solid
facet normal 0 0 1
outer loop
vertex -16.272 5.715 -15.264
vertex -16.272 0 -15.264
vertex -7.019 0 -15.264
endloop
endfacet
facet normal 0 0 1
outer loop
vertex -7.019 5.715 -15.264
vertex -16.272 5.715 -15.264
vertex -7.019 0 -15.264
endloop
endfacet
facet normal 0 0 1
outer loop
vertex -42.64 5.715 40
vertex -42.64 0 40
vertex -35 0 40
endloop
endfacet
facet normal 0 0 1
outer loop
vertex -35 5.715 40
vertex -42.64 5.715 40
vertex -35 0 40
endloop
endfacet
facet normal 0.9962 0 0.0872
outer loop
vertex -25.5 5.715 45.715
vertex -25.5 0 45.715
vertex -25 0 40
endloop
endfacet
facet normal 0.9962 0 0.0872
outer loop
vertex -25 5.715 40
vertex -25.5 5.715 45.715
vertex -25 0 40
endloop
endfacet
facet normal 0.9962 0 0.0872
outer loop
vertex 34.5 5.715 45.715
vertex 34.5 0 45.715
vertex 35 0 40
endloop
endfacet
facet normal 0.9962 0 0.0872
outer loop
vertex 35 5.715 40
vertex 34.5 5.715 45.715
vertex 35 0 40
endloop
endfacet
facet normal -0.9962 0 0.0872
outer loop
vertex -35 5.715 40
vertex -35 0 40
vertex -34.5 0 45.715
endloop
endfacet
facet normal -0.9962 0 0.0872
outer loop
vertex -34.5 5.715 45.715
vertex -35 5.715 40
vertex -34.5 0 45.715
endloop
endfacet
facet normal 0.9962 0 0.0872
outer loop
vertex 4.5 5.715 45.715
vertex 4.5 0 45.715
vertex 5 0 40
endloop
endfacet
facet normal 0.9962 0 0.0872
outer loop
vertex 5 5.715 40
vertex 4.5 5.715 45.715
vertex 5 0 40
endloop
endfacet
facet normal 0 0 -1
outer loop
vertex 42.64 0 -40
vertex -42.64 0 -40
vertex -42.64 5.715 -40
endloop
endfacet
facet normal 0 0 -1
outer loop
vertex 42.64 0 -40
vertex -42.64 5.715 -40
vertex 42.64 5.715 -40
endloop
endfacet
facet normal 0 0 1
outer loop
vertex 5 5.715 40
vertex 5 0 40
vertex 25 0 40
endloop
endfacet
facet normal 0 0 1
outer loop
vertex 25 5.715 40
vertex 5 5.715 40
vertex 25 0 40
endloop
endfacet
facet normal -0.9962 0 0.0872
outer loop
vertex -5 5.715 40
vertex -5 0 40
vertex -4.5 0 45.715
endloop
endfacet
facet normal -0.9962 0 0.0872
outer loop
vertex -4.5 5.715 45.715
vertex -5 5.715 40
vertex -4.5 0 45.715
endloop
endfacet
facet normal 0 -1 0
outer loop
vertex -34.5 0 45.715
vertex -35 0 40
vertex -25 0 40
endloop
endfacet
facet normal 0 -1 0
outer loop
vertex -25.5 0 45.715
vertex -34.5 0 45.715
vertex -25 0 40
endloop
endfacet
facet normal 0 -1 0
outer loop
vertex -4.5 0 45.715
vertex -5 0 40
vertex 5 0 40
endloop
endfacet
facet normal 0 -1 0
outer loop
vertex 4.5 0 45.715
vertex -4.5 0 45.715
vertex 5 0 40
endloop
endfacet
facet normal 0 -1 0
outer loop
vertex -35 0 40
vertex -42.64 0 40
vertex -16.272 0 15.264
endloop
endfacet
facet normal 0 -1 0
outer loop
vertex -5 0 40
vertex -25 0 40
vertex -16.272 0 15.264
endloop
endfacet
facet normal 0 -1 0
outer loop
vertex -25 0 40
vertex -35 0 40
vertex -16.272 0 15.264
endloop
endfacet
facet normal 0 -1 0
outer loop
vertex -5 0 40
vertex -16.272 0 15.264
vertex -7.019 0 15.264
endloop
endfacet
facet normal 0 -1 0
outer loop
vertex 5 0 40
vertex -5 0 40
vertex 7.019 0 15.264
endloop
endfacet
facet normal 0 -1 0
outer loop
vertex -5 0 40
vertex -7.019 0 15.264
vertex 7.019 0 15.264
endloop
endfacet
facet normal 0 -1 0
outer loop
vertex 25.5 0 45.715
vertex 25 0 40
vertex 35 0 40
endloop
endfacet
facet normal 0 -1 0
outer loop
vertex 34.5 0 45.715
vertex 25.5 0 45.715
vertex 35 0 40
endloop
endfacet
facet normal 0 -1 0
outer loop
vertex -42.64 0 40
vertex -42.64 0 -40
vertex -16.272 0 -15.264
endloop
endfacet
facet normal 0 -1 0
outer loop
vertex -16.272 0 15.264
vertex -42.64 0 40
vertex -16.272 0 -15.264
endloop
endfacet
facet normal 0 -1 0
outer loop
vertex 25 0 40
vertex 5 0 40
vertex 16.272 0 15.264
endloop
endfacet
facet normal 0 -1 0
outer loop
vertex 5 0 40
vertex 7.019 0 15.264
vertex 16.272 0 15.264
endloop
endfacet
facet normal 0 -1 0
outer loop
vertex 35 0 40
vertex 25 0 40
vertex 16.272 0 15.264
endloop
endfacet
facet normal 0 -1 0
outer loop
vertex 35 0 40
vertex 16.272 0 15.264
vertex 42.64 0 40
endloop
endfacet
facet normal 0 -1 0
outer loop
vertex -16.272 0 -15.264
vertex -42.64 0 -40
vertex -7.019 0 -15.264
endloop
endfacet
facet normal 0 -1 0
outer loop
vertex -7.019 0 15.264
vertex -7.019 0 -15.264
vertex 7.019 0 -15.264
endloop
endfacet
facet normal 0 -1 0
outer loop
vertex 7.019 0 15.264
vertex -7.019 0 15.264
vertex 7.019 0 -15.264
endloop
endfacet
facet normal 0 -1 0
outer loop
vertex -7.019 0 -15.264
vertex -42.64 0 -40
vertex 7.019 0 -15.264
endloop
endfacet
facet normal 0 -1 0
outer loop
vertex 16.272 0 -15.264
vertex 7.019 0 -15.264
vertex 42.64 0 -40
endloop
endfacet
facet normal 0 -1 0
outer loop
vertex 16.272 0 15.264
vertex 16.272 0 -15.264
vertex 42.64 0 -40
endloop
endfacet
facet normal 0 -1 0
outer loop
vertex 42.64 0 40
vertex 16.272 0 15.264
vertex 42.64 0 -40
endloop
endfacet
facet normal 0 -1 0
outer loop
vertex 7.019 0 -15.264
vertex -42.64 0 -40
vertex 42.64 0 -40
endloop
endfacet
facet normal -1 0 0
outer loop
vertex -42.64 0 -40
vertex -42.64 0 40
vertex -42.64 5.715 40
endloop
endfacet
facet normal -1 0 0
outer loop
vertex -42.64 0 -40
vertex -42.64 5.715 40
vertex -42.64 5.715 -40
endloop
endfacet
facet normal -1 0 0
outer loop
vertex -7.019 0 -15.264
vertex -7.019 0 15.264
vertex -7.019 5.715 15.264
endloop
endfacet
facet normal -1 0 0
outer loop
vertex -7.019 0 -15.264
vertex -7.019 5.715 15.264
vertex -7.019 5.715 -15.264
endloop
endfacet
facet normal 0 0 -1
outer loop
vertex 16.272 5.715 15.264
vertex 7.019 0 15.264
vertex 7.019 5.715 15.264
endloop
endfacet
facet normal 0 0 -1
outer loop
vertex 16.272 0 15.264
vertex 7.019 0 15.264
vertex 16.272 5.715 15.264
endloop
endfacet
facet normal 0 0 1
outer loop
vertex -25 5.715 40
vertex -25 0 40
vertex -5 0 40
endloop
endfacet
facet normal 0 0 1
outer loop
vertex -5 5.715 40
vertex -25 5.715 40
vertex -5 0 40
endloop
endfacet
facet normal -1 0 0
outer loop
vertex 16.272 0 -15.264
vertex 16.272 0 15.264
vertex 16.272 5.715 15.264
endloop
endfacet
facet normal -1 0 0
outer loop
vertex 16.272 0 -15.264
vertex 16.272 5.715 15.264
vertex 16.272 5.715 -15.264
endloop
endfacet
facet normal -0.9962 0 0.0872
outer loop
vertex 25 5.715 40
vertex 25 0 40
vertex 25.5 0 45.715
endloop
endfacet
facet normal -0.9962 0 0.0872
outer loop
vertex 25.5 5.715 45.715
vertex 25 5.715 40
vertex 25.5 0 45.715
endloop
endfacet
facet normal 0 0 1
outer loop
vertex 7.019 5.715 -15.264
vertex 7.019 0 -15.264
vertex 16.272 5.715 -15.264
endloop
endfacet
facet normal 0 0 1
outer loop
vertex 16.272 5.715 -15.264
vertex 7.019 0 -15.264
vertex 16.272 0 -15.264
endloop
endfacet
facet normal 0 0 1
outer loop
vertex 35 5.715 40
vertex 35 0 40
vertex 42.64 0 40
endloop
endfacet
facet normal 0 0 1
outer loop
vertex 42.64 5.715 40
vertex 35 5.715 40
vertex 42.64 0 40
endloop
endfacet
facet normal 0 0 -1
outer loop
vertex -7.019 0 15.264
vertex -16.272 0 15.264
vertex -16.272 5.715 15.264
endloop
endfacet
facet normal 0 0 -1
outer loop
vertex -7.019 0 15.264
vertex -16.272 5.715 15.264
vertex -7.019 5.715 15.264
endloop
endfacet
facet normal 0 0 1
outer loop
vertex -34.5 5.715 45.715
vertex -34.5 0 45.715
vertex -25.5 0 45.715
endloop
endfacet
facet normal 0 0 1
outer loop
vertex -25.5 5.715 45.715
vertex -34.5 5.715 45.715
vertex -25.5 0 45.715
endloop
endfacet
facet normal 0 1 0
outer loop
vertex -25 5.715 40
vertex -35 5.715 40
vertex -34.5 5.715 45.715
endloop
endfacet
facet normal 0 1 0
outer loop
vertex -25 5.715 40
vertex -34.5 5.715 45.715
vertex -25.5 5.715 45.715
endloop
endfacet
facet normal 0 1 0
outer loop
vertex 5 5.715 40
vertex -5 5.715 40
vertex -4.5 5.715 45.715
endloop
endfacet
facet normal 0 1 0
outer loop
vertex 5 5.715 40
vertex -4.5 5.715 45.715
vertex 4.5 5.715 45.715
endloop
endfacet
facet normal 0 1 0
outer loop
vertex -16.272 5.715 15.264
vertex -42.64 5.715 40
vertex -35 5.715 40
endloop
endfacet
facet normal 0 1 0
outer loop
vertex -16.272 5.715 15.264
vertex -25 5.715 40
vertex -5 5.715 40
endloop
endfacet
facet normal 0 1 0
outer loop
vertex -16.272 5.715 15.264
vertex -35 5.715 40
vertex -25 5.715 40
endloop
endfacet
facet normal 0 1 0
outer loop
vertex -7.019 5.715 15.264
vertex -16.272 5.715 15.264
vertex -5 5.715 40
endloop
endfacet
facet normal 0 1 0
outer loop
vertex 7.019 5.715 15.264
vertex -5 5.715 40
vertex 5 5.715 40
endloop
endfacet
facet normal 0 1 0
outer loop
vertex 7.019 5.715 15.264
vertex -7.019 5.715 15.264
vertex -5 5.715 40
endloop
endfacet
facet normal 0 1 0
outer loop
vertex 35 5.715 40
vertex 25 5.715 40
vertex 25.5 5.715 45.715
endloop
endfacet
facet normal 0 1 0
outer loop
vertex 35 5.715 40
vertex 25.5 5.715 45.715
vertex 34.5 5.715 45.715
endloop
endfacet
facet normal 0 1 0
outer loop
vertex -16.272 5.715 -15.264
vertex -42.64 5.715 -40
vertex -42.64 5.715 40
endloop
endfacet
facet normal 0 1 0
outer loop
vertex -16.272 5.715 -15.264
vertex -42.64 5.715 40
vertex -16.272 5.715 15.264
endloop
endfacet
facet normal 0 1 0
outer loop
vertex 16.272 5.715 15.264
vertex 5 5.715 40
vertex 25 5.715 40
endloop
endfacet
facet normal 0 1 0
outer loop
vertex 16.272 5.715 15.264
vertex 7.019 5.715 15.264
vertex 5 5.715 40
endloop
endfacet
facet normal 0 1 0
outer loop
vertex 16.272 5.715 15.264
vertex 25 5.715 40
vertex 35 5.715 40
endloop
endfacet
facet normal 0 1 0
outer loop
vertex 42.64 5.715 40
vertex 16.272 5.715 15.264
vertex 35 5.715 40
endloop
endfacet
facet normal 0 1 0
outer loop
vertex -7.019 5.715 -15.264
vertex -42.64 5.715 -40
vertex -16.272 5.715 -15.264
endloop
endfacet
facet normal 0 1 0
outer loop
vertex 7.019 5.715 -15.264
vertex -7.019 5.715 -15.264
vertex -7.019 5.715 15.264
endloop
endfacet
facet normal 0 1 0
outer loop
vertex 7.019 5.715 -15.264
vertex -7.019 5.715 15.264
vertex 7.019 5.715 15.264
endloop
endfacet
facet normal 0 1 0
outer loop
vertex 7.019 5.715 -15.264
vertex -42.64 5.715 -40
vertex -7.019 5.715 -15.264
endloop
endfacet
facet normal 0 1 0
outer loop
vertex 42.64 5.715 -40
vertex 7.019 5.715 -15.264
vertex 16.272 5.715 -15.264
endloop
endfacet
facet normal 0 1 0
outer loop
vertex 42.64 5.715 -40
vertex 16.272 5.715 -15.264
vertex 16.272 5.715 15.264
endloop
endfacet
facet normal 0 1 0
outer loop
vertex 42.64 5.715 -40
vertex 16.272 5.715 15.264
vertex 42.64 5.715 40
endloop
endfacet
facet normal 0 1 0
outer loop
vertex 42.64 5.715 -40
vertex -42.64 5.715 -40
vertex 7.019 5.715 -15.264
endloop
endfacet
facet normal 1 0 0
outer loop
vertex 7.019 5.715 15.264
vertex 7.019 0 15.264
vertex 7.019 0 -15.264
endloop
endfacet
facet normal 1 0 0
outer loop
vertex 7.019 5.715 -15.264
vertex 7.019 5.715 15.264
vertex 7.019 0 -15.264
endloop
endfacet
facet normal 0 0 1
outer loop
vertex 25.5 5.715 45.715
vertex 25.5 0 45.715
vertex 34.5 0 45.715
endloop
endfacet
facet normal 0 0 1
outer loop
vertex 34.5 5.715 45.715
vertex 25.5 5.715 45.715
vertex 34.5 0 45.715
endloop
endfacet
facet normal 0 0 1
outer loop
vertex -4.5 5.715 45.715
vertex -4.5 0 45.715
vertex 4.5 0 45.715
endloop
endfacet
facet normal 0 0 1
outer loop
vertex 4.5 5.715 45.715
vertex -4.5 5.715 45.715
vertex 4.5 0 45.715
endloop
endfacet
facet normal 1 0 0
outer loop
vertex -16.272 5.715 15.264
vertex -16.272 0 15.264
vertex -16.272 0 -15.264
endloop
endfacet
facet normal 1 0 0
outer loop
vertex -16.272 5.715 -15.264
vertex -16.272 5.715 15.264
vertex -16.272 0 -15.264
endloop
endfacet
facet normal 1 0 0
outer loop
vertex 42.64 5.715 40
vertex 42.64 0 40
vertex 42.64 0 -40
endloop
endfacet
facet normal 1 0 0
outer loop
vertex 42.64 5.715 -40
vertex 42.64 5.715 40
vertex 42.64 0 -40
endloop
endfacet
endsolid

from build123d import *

# Parameters (mm, degrees)
SKETCH2_W           = 85.279590556
SKETCH2_H           = 80
SKETCH2_W_2         = 9.25294304
SKETCH2_H_2         = 30.528437524
BOSS_EXTRUDE1_DEPTH = 5.715


with BuildPart() as part:
    # Sketch2 → Boss-Extrude1 (new body)
    with BuildSketch(Plane(origin=(0, 0, 0), x_dir=(1, 0, 0), z_dir=(0, 1, 0))):
        Rectangle(SKETCH2_W, SKETCH2_H)
        with Locations((-11.645107557, 0)):
            Rectangle(SKETCH2_W_2, SKETCH2_H_2, mode=Mode.SUBTRACT)
        with Locations((11.645107557, 0)):
            Rectangle(SKETCH2_W_2, SKETCH2_H_2, mode=Mode.SUBTRACT)
        Polygon((-25, -40), (-35, -40), (-34.5, -45.715), (-25.5, -45.715), align=None)
        Polygon((5, -40), (-5, -40), (-4.5, -45.715), (4.5, -45.715), align=None)
        Polygon((34.5, -45.715), (35, -40), (25, -40), (25.5, -45.715), align=None)
    extrude(amount=BOSS_EXTRUDE1_DEPTH)


solid = part.part
